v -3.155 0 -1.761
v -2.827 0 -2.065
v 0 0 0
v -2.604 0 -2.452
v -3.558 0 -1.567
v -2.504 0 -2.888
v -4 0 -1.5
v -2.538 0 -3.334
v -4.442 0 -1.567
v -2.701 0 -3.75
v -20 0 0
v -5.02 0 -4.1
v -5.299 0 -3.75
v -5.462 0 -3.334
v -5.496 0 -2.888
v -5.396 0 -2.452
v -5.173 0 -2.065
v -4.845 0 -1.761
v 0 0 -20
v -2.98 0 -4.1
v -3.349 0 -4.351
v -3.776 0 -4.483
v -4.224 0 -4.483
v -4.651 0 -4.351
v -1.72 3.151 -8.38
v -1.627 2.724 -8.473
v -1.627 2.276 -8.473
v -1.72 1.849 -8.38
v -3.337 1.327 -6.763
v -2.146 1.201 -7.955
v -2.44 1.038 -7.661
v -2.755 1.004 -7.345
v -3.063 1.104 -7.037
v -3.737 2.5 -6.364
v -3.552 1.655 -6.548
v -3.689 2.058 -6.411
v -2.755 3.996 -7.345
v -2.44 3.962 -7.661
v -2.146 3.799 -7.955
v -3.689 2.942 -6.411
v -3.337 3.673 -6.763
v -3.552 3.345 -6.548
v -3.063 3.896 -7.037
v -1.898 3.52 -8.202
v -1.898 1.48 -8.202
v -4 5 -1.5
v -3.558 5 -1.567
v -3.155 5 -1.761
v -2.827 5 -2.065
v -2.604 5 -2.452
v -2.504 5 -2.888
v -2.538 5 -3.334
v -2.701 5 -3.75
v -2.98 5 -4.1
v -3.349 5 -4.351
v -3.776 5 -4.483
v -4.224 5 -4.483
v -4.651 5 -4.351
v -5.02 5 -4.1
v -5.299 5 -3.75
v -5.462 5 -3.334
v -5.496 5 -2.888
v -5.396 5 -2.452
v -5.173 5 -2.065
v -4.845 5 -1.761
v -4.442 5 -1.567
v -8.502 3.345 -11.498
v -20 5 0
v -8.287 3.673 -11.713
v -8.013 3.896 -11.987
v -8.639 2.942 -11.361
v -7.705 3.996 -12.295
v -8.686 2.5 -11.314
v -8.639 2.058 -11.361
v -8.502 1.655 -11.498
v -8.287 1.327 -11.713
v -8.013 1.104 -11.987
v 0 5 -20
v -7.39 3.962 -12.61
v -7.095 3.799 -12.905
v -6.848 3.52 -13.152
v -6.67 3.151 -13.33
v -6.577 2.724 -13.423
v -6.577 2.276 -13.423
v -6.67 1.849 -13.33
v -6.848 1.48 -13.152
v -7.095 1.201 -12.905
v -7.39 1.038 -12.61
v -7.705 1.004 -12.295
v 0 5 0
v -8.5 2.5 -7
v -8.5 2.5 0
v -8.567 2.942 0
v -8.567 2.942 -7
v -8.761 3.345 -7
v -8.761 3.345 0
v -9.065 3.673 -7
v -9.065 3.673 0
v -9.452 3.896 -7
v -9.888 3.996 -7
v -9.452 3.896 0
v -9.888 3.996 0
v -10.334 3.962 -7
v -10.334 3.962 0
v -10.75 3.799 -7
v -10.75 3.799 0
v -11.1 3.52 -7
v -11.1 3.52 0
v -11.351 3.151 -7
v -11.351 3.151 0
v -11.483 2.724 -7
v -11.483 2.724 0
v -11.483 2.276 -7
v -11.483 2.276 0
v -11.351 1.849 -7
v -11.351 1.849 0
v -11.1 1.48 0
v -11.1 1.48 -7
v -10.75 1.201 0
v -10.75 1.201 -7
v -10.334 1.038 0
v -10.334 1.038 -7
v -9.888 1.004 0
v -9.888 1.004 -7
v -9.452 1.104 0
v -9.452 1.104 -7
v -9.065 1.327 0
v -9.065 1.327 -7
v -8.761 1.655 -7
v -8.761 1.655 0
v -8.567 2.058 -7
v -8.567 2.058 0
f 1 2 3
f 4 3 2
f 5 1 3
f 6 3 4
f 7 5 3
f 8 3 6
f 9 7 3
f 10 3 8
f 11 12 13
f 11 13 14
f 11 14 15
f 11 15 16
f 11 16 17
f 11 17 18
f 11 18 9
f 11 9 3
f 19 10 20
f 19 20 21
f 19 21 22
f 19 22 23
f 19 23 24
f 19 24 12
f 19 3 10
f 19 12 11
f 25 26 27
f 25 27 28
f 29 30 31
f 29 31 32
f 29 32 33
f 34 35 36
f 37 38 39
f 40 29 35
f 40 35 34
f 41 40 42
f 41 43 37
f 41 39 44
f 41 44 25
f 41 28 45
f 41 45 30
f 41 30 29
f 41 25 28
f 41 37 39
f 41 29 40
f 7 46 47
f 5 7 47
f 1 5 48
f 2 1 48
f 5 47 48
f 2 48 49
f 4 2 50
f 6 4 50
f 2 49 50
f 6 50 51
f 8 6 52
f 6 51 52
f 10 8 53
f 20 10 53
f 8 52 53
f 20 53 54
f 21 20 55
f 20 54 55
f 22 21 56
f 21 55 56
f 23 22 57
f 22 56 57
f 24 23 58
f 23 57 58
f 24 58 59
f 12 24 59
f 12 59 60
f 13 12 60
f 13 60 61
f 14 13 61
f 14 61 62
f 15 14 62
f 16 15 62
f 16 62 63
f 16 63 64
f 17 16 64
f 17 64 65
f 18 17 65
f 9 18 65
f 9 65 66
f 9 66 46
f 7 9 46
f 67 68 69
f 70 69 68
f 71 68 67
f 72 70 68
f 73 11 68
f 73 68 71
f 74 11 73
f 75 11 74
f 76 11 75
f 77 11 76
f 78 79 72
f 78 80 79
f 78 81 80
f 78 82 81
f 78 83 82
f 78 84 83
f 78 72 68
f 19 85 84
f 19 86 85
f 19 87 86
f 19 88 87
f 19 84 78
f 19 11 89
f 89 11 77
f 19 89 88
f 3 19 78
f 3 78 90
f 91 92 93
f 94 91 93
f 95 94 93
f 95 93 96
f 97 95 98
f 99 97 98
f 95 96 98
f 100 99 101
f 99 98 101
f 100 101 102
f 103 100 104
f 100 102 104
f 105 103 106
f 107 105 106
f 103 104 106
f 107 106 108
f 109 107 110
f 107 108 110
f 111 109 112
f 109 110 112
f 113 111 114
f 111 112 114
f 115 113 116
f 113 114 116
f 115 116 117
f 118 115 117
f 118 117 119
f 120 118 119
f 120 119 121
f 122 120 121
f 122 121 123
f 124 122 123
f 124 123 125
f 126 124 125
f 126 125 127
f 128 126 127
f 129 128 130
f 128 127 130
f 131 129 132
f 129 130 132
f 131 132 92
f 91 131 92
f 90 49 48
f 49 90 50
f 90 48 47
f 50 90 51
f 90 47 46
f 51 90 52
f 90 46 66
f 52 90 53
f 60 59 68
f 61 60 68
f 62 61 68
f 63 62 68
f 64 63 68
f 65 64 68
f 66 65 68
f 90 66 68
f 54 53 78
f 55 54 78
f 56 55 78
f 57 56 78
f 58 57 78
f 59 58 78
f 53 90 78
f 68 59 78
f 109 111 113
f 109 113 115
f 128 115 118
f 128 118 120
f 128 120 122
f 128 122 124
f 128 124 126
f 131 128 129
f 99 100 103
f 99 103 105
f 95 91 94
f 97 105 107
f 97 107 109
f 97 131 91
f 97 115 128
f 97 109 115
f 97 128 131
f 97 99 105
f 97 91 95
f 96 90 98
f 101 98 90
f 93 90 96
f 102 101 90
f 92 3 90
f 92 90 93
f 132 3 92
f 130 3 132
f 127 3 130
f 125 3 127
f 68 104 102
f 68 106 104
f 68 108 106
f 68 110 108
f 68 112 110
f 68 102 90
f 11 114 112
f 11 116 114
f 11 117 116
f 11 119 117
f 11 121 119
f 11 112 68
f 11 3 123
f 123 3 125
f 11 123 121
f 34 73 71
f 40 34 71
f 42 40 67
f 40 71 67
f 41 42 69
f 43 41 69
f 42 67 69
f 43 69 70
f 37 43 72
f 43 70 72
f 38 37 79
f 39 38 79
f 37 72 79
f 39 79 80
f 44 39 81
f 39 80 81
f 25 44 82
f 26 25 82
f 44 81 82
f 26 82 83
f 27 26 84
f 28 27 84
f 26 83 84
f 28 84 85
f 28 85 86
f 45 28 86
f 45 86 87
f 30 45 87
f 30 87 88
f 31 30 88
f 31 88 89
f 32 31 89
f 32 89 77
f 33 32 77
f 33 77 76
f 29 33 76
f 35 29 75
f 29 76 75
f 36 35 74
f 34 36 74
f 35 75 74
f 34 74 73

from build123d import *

# Parameters (mm, degrees)
BOSS_EXTRUDE1_DEPTH = 5
SKETCH2_R           = 1.5
CUT_EXTRUDE1_DEPTH  = 7
SKETCH3_R           = 1.5
CUT_EXTRUDE2_DEPTH  = 7
SKETCH4_R           = 1.5
CUT_EXTRUDE3_DEPTH  = 7


with BuildPart() as part:
    # Sketch1 → Boss-Extrude1 (new body)
    with BuildSketch(Plane(origin=(0, 0, 0), x_dir=(1, 0, 0), z_dir=(0, 1, 0))):
        Polygon((0, 0), (-20, 0), (0, 20), align=None)
    extrude(amount=BOSS_EXTRUDE1_DEPTH)

    # Sketch2 → Cut-Extrude1 (cut)
    with BuildSketch(Plane.XY):
        with Locations((-10, 2.5)):
            Circle(SKETCH2_R)
    extrude(amount=-CUT_EXTRUDE1_DEPTH, mode=Mode.SUBTRACT)

    # Sketch3 → Cut-Extrude2 (cut)
    with BuildSketch(Plane(origin=(-10, 0, -10), x_dir=(-0.7071067811865511, 0, 0.7071067811865439), z_dir=(-0.7071067811865439, 0, -0.7071067811865511))):
        with Locations((-3.357864376, 2.5)):
            Circle(SKETCH3_R)
    extrude(amount=-CUT_EXTRUDE2_DEPTH, mode=Mode.SUBTRACT)

    # Sketch4 → Cut-Extrude3 (cut)
    with BuildSketch(Plane(origin=(0, 5, 0), x_dir=(1, 0, 0), z_dir=(0, 1, 0))):
        with Locations(Location((-4, 3, 0), (0, 0, 270))):
            Circle(SKETCH4_R)
    extrude(amount=-CUT_EXTRUDE3_DEPTH, mode=Mode.SUBTRACT)


solid = part.part
